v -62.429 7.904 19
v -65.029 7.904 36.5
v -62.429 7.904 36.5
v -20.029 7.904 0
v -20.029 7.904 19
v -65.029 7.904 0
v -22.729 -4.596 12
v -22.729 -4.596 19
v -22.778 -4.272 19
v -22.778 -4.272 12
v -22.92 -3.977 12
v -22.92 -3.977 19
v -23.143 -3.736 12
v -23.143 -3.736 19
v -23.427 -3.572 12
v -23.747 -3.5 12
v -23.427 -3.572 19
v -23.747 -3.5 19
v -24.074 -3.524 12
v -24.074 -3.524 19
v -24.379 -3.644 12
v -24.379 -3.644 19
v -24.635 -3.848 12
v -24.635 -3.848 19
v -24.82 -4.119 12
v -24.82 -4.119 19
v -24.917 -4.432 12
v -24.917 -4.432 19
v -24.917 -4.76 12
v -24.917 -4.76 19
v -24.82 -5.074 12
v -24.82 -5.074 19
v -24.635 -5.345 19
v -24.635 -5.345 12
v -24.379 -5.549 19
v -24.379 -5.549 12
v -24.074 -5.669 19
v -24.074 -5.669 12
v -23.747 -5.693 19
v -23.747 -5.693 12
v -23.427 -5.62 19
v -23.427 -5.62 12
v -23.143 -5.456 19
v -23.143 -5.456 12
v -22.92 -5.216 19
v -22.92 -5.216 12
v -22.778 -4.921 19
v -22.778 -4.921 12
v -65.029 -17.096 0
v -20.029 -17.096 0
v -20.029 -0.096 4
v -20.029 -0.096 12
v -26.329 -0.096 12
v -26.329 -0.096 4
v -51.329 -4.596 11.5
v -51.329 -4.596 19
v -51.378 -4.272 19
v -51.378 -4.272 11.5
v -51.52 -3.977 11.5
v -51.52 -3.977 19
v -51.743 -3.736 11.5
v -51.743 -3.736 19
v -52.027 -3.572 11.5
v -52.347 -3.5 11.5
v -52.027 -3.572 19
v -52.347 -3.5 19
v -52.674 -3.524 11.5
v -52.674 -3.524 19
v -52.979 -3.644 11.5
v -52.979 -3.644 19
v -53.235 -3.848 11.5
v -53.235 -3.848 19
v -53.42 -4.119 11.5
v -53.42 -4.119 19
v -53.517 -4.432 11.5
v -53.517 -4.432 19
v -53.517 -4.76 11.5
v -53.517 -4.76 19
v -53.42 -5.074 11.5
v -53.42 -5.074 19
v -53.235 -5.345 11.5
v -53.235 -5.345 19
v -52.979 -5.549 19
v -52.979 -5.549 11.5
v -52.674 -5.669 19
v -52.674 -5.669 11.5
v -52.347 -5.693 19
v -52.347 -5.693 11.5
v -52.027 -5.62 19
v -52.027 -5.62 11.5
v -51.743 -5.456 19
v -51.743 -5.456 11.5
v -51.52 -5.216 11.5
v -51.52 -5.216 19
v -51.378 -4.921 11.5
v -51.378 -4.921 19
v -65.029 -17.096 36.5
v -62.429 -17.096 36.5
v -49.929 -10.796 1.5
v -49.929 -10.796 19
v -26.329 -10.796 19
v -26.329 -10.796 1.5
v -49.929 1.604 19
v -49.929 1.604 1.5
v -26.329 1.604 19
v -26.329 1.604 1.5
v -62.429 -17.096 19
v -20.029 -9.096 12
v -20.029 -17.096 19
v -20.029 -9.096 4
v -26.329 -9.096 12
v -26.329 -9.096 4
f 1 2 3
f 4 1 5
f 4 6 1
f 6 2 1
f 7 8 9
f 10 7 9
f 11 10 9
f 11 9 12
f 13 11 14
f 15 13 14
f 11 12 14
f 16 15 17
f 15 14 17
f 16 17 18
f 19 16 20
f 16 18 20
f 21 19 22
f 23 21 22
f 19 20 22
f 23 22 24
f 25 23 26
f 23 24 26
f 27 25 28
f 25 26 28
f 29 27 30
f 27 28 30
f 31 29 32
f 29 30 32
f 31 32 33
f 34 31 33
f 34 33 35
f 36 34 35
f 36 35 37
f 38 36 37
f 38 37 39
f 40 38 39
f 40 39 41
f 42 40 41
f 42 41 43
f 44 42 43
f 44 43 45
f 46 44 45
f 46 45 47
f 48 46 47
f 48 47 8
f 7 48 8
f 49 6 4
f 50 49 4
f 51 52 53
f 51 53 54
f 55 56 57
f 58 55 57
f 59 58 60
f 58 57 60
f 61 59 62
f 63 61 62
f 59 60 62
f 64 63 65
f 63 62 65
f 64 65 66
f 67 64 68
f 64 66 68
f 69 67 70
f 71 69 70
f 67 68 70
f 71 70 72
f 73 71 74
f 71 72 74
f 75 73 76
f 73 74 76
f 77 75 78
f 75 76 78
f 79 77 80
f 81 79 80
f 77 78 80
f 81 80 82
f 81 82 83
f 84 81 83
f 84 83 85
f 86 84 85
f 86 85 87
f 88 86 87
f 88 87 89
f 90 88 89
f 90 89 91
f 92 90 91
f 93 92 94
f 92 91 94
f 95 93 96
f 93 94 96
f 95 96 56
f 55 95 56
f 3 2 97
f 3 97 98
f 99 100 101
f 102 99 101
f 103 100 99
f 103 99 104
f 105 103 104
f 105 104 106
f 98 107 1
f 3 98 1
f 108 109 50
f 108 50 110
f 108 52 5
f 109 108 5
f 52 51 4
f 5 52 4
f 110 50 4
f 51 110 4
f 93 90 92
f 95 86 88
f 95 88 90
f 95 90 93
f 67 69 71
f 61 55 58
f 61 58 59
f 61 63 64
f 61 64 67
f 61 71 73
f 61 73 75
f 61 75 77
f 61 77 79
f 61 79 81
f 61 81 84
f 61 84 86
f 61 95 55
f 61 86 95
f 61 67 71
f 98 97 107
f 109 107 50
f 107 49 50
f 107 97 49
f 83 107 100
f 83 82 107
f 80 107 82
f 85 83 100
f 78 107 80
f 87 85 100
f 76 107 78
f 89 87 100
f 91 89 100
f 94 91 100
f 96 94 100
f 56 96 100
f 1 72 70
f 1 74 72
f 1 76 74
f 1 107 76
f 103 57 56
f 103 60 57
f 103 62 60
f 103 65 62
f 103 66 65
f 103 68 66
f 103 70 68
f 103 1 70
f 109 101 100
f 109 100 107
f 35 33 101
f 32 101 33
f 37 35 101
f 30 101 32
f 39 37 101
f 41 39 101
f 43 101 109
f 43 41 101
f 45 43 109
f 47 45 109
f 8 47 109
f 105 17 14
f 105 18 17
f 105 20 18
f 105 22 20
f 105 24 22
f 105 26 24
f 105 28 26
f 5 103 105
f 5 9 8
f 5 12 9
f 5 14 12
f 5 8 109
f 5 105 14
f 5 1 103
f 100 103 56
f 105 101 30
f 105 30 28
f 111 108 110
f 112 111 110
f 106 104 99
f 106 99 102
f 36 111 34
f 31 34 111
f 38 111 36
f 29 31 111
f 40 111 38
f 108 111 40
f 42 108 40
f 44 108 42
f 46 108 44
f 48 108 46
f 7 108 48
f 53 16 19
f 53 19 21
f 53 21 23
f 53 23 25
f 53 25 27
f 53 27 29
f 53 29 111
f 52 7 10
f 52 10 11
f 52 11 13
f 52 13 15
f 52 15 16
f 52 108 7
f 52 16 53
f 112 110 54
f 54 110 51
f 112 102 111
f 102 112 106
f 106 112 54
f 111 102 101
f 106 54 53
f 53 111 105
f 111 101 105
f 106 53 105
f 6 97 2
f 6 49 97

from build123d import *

# Parameters (mm, degrees)
SKETCH_1_W          = 45
SKETCH_1_H          = 25
EXTRUDE_2_DEPTH     = 19
SKETCH_4_W          = 23.6
SKETCH_4_H          = 12.4
CUT_EXTRUDE_2_DEPTH = 17.5
SKETCH_5_W          = 8
SKETCH_5_H          = 9
CUT_EXTRUDE_4_DEPTH = 7
SKETCH_6_R          = 1.1
CUT_EXTRUDE_6_DEPTH = 7.5
SKETCH_8_W          = 2.6
SKETCH_8_H          = 25
EXTRUDE_3_DEPTH     = 17.5


with BuildPart() as part:
    # 草圖1 → 填料-伸長2 (new body)
    with BuildSketch(Plane.XY):
        with Locations((-42.528991691, -4.596431101)):
            Rectangle(SKETCH_1_W, SKETCH_1_H)
    extrude(amount=EXTRUDE_2_DEPTH)

    # 草圖4 → 除料-伸長2 (cut)
    with BuildSketch(Plane.XY.offset(19)):
        with Locations((-38.128991691, -4.596431101)):
            Rectangle(SKETCH_4_W, SKETCH_4_H)
    extrude(amount=-CUT_EXTRUDE_2_DEPTH, mode=Mode.SUBTRACT)

    # 草圖5 → 除料-伸長4 (cut)
    with BuildSketch(Plane(origin=(-20.028991691, 0, 0), x_dir=(0, 0, -1), z_dir=(1, 0, 0))):
        with Locations((-8, -4.596431101)):
            Rectangle(SKETCH_5_W, SKETCH_5_H)
    extrude(amount=-CUT_EXTRUDE_4_DEPTH, mode=Mode.SUBTRACT)

    # 草圖6 → 除料-伸長6 (cut)
    with BuildSketch(Plane.XY.offset(19)):
        with Locations((-23.828991691, -4.596431101)):
            Circle(SKETCH_6_R)
        with Locations((-52.428991691, -4.596431101)):
            Circle(SKETCH_6_R)
    extrude(amount=-CUT_EXTRUDE_6_DEPTH, mode=Mode.SUBTRACT)

    # 草圖8 → 填料-伸長3 (add)
    with BuildSketch(Plane.XY.offset(19)):
        with Locations((-63.728991691, -4.596431101)):
            Rectangle(SKETCH_8_W, SKETCH_8_H)
    extrude(amount=EXTRUDE_3_DEPTH)


solid = part.part
